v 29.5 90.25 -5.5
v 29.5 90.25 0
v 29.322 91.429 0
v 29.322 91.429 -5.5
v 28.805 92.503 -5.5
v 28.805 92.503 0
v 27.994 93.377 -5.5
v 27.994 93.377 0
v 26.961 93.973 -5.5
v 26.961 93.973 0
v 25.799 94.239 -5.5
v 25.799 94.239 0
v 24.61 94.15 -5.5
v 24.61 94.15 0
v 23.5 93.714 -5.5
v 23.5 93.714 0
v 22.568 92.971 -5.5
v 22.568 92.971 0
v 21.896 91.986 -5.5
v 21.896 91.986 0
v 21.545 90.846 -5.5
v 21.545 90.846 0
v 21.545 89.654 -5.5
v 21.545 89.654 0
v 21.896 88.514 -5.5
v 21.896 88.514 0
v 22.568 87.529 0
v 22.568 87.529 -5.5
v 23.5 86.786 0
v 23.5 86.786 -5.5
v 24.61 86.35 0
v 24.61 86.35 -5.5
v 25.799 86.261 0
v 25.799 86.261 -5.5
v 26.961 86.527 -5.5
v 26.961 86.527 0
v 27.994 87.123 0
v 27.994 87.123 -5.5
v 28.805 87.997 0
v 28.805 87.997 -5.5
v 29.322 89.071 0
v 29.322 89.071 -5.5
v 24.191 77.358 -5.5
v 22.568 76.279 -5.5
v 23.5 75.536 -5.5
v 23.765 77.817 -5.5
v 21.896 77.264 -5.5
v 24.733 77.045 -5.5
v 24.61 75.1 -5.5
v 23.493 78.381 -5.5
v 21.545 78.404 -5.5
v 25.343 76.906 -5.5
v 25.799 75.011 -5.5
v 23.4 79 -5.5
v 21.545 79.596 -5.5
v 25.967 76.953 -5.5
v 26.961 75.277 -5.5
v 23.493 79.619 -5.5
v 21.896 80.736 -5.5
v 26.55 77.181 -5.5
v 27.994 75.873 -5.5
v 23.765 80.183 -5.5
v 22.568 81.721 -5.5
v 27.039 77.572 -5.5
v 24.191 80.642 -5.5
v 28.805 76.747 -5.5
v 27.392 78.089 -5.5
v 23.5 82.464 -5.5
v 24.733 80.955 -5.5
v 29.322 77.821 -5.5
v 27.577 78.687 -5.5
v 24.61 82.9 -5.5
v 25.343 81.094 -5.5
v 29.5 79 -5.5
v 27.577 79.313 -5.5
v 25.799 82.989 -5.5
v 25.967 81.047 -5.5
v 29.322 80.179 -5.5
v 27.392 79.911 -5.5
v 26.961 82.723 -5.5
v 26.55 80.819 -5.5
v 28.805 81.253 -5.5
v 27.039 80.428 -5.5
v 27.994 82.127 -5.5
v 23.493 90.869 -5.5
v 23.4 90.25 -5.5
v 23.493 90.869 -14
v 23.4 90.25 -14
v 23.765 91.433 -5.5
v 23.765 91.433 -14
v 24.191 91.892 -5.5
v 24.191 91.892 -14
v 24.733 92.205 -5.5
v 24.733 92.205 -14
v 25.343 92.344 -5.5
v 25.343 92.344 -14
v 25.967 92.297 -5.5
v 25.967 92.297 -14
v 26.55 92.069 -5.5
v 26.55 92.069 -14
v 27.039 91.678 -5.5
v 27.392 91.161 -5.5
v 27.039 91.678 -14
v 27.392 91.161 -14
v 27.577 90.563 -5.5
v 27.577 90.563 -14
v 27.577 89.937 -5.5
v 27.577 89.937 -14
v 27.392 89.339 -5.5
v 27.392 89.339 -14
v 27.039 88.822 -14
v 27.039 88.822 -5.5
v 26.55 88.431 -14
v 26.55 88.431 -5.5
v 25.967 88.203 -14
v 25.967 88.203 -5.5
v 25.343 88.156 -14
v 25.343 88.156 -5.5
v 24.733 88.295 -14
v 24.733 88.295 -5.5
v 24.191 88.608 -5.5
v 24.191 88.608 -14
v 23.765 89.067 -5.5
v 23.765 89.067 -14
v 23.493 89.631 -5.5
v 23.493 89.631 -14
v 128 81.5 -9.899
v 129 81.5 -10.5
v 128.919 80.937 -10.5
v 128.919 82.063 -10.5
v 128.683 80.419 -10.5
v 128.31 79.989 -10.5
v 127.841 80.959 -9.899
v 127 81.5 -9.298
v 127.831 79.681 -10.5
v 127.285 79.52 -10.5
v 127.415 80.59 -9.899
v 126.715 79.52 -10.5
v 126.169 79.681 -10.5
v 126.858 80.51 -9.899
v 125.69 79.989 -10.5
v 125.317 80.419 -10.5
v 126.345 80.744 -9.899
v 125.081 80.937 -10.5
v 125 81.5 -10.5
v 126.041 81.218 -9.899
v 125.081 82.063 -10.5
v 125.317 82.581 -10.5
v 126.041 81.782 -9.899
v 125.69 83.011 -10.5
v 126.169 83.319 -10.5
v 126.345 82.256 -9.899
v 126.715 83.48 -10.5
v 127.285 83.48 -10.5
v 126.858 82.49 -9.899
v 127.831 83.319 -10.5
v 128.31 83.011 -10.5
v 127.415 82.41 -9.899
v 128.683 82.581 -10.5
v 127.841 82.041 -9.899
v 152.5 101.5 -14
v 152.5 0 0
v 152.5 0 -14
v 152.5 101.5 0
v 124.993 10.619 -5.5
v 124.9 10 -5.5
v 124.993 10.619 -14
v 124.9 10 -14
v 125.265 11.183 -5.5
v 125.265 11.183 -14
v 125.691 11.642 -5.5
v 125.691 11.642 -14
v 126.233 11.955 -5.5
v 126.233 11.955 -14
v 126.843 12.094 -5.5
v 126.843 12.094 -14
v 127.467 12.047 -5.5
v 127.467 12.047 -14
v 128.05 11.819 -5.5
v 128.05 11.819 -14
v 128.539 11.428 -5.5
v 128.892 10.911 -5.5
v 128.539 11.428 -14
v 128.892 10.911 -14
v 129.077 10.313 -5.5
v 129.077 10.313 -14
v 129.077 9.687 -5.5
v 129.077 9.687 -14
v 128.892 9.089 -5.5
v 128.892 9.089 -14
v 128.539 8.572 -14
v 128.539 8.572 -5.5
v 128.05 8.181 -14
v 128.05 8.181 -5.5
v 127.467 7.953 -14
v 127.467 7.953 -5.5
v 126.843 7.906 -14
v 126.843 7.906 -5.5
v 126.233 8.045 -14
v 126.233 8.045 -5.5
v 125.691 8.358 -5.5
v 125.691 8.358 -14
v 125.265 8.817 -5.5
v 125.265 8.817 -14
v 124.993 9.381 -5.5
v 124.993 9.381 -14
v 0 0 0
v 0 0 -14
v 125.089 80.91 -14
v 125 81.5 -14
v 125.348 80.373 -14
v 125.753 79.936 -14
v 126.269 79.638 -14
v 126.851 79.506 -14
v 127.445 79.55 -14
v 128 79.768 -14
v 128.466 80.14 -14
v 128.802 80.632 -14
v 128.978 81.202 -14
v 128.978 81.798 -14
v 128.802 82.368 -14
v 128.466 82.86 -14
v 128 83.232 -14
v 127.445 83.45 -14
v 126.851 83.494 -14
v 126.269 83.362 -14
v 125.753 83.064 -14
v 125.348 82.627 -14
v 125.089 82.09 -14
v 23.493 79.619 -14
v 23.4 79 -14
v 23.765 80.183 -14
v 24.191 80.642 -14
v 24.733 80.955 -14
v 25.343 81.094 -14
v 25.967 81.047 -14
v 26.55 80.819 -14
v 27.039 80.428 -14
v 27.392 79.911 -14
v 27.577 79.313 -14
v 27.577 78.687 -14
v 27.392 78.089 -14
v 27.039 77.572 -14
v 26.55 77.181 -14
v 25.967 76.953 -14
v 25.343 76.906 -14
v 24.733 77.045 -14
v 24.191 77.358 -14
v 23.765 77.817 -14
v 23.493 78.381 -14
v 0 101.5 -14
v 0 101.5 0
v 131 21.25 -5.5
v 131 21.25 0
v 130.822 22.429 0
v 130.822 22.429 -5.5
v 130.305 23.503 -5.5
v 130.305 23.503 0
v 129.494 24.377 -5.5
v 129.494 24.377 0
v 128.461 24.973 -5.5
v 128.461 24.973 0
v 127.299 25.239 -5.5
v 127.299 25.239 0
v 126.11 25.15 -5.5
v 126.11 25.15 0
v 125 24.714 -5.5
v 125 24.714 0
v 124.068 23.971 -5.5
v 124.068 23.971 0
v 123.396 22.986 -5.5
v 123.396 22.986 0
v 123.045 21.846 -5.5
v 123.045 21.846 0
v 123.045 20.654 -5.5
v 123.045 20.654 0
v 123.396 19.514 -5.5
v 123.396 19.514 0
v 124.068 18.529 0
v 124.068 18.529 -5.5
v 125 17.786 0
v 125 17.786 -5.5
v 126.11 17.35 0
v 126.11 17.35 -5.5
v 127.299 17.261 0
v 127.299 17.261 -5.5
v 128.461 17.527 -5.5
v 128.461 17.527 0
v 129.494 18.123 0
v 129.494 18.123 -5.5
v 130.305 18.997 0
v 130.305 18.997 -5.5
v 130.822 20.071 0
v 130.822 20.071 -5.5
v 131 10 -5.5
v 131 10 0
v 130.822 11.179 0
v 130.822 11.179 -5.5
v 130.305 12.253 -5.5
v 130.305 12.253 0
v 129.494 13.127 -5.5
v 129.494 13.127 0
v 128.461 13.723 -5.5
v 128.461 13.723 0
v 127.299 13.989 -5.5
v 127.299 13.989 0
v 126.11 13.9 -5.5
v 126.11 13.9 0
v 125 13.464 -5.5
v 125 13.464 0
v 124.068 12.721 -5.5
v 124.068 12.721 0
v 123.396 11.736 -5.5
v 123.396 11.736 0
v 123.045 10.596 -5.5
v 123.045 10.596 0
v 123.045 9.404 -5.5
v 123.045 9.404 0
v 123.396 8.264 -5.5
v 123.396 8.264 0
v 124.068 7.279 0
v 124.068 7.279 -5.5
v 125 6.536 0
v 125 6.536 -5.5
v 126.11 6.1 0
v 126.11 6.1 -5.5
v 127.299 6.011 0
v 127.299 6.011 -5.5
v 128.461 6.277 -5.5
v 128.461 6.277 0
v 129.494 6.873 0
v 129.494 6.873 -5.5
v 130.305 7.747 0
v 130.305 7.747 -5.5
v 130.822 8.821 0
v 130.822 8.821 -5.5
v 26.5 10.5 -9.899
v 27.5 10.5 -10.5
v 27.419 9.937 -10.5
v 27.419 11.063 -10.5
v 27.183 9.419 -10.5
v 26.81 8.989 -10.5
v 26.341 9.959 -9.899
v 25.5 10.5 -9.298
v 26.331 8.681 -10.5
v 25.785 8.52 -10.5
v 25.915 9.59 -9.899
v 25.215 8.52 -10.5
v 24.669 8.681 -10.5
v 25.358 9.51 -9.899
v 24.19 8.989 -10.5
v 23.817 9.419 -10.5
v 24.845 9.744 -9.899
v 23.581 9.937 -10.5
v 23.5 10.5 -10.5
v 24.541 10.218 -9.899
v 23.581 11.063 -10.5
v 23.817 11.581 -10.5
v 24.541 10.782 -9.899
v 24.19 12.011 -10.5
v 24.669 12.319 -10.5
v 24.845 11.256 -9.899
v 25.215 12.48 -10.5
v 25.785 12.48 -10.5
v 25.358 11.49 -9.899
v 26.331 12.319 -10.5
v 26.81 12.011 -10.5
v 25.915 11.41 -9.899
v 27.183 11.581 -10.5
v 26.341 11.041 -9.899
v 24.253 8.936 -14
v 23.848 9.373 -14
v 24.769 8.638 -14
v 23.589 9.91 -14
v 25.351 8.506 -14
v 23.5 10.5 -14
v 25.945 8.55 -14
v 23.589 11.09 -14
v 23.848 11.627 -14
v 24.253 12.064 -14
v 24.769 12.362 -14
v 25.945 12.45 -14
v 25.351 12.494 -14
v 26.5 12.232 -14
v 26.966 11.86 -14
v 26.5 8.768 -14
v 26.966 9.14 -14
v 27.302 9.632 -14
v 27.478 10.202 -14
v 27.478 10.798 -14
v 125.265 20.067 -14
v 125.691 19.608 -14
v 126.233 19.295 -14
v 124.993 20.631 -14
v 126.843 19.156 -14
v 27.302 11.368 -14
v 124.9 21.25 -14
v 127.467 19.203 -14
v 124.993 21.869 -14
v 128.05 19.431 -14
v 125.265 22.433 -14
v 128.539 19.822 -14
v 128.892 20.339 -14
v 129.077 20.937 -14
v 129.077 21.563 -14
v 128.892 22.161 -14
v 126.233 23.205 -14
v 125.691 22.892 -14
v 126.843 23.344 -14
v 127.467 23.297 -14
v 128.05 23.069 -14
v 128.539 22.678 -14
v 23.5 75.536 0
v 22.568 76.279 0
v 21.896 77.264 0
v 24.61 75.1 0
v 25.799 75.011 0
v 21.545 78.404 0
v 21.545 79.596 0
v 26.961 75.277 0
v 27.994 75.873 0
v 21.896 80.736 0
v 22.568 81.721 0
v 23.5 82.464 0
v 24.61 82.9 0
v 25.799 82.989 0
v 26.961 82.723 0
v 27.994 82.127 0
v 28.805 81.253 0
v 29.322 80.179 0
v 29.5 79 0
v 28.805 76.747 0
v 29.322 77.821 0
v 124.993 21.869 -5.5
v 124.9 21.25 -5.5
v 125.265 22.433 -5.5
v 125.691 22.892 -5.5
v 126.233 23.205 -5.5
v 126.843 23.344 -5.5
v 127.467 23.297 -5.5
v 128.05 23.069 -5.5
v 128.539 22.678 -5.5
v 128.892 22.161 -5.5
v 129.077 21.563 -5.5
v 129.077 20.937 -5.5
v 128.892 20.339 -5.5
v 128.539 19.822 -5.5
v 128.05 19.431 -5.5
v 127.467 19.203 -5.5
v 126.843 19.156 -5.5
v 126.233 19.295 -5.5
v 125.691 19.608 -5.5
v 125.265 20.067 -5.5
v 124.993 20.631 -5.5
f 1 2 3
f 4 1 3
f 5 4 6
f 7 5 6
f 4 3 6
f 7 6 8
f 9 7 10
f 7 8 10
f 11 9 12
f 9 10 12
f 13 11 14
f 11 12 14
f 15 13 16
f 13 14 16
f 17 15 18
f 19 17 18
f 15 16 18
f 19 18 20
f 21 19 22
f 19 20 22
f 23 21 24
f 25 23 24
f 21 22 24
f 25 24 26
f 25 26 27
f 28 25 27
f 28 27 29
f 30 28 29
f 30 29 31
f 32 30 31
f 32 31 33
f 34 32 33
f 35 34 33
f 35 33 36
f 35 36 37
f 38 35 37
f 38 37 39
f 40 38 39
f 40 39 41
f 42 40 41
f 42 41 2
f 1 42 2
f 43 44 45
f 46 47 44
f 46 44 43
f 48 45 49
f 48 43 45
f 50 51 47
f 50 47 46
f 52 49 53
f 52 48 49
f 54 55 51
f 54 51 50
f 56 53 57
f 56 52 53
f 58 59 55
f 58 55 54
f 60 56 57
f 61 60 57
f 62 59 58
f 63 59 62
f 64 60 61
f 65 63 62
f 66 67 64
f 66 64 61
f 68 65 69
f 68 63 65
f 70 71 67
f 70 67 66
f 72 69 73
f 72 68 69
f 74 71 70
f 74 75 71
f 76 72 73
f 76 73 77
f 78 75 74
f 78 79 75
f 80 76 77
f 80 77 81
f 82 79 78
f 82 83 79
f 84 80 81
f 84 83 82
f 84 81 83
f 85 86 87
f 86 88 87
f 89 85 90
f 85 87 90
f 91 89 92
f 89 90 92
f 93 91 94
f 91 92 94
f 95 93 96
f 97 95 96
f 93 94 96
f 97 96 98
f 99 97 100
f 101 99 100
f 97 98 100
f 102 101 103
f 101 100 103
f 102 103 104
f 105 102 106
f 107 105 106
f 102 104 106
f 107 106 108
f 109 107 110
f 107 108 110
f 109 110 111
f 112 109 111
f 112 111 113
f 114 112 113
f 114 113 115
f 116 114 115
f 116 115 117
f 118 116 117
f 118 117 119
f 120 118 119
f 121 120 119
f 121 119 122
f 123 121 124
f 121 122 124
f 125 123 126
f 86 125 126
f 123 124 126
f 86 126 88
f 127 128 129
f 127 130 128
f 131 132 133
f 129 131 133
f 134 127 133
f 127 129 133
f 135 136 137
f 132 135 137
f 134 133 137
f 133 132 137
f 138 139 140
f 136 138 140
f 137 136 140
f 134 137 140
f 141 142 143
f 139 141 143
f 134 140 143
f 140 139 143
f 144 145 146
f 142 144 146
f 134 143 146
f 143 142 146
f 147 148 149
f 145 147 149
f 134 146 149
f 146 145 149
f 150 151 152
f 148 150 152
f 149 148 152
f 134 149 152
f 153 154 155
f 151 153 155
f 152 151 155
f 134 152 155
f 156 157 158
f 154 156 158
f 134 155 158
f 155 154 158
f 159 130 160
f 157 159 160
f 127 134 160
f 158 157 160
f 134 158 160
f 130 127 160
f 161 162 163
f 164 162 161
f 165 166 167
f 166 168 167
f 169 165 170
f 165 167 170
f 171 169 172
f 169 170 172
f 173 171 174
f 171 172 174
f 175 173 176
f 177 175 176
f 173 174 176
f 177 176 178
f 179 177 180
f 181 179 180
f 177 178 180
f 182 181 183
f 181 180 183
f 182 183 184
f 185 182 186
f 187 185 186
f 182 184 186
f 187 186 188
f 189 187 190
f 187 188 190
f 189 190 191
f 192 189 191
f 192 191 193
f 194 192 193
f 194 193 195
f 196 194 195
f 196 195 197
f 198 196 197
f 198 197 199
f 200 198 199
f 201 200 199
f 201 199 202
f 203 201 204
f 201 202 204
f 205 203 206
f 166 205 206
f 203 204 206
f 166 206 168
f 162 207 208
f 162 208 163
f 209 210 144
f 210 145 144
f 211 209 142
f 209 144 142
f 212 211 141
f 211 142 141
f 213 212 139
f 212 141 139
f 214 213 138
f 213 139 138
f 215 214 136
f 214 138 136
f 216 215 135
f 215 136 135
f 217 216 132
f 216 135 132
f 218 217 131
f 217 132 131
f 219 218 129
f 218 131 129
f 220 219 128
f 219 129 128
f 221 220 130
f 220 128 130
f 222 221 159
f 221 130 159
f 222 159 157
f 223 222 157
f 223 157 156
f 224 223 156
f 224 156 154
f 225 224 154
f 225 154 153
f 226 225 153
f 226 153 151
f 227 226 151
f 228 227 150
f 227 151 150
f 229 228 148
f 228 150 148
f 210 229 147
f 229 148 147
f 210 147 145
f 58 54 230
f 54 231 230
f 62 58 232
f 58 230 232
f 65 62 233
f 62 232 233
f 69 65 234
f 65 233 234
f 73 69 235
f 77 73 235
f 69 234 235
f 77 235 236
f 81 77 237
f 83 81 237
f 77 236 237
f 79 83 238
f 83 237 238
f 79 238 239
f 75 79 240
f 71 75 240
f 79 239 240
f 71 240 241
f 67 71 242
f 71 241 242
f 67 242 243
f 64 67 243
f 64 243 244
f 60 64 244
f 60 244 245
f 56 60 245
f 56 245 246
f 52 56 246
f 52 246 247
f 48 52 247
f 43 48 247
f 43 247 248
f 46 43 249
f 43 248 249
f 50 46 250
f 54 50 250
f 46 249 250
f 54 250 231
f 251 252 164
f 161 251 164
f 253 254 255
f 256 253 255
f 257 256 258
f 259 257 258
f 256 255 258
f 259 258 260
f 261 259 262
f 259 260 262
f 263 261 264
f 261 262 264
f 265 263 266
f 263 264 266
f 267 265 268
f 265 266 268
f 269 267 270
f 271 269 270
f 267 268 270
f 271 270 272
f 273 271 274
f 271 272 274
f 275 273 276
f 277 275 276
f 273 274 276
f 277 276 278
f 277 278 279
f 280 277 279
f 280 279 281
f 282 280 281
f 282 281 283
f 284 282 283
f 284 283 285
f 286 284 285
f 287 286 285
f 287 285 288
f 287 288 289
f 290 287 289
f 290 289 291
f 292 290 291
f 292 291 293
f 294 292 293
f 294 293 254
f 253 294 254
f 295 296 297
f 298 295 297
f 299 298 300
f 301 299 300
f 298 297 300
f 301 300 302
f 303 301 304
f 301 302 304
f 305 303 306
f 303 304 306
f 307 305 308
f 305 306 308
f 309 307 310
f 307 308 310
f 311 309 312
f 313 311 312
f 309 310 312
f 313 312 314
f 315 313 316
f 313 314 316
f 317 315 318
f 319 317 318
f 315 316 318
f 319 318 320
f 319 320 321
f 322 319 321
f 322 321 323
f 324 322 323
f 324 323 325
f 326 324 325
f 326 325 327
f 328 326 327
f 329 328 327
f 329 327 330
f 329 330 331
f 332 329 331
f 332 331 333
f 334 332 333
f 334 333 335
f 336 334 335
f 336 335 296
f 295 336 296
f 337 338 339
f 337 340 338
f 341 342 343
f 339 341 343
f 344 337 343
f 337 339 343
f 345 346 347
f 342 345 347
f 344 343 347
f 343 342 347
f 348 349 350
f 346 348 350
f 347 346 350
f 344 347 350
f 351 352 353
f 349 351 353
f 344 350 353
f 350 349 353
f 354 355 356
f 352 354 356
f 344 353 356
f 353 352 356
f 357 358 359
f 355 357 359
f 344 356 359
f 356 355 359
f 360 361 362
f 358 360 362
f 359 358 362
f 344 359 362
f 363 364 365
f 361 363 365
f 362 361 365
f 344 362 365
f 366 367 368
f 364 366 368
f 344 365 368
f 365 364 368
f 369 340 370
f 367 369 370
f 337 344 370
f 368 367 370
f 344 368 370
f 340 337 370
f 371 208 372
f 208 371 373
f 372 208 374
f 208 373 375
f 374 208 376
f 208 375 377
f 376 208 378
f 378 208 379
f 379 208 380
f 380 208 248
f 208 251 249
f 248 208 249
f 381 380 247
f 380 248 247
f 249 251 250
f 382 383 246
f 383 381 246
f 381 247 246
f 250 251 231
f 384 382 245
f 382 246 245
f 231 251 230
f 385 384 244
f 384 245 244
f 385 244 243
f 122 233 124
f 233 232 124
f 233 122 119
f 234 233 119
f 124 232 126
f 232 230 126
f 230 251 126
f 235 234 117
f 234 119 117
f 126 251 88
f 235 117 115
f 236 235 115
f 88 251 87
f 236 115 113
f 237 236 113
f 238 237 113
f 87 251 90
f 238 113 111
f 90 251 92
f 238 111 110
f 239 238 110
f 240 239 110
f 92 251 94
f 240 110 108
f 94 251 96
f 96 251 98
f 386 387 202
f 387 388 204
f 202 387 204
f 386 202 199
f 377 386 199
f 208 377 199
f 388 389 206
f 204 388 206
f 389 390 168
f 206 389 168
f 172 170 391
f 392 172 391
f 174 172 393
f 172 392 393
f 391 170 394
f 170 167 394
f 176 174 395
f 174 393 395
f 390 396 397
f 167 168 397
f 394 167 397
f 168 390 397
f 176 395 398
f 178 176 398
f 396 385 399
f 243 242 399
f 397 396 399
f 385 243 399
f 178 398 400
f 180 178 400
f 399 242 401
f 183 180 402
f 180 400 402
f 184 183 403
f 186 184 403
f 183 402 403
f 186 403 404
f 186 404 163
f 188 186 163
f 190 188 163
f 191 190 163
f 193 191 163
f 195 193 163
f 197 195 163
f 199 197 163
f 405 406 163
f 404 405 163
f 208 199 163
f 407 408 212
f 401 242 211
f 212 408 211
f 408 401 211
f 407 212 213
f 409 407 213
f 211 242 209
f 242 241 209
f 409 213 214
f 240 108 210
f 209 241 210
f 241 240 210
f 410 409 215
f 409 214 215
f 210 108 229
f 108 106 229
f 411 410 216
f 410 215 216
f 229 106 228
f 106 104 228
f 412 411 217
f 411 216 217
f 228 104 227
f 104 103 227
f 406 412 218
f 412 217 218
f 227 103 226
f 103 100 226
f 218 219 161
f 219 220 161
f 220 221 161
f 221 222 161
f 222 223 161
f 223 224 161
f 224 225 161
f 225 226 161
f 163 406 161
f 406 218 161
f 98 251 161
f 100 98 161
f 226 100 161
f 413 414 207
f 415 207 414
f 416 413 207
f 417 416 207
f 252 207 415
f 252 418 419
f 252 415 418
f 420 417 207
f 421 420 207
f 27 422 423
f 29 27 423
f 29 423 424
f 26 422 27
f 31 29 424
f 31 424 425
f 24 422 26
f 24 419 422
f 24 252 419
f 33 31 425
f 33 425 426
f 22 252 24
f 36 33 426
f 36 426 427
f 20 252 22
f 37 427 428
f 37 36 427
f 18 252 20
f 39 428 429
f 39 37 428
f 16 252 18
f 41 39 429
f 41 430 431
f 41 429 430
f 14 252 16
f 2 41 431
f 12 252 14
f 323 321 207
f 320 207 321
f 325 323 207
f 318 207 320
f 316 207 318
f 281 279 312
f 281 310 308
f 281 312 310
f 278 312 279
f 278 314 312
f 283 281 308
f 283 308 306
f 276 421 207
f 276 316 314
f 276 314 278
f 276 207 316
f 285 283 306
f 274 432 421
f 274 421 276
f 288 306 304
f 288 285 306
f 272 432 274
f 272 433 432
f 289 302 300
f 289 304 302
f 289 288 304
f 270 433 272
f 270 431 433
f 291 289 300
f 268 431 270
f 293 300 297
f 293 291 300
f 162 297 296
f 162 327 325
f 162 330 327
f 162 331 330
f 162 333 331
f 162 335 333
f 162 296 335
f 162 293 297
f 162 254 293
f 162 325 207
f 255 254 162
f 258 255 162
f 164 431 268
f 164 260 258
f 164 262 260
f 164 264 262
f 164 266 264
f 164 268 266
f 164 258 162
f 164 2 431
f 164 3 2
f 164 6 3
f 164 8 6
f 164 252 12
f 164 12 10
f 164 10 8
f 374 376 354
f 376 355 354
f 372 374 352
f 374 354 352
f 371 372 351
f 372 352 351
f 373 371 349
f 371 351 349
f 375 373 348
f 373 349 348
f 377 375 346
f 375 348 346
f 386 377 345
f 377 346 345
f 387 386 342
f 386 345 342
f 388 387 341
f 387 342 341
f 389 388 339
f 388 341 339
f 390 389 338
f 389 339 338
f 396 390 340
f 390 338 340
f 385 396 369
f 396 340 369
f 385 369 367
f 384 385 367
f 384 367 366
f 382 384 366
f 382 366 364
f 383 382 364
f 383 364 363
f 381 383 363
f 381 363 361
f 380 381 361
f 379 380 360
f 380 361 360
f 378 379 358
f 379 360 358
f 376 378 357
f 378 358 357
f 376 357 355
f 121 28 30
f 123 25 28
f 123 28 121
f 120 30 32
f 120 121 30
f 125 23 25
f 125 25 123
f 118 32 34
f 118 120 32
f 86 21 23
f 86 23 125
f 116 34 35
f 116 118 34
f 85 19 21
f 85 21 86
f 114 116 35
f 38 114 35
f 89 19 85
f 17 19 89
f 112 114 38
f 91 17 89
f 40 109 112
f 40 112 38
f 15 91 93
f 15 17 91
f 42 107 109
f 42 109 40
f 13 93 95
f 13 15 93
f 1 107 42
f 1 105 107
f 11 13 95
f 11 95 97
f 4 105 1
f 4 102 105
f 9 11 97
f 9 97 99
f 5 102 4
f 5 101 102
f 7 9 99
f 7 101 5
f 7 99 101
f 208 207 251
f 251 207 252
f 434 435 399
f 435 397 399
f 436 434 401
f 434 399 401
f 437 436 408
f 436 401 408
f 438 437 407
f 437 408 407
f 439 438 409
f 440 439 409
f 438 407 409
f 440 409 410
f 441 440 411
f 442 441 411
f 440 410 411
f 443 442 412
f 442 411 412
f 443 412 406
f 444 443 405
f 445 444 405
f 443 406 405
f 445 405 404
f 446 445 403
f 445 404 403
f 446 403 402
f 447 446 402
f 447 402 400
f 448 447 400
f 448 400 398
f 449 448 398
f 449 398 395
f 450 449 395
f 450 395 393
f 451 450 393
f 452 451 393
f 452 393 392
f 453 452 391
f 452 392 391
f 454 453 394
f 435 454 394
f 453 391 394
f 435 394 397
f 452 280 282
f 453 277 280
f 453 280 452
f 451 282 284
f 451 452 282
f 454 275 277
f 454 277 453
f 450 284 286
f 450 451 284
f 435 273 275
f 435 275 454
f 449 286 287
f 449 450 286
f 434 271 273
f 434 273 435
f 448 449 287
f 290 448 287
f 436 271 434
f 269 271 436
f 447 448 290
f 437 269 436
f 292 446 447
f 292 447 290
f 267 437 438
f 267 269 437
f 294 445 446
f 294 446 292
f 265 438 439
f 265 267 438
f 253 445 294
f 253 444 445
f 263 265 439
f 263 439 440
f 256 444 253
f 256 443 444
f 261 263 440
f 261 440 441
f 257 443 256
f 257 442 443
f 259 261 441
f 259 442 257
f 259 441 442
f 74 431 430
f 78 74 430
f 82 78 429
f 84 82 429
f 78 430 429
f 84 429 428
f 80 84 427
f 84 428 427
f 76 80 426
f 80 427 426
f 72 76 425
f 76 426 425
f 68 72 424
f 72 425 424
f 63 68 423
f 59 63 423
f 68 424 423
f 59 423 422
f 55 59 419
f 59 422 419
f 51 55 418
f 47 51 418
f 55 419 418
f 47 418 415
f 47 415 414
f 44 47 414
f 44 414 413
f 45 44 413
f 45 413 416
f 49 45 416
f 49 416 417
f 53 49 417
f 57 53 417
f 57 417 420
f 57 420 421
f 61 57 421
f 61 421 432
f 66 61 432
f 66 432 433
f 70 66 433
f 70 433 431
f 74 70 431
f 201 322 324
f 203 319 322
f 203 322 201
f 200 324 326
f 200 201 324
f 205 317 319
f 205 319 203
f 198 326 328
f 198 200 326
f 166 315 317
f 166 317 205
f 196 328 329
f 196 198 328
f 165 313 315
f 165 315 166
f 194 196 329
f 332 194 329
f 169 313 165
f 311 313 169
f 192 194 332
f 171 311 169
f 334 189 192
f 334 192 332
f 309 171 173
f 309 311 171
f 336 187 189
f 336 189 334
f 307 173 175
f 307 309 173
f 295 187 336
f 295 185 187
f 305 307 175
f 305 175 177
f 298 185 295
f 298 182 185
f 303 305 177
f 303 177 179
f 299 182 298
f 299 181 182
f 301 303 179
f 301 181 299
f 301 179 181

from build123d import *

# Parameters (mm, degrees)
F0_W           = 152.5
F0_H           = 101.5
F1_DEPTH       = 14
F2_D           = 4.2
F2_CBORE_D     = 8
F2_CBORE_DEPTH = 5.5
F4_D           = 4
F4_DEPTH       = 3.5
F4_TIP         = 1.2017212381


with BuildPart() as f1:
    # F0 (on Top) → F1 (new body)
    with BuildSketch(Plane.XY):
        with Locations((76.25, 50.75)):
            Rectangle(F0_W, F0_H)
    extrude(amount=-F1_DEPTH)

    # F2 (through all)
    with Locations(Plane.XY):
        with Locations((127, 10), (127, 21.25), (25.5, 90.25), (25.5, 79)):
            CounterBoreHole(F2_D / 2, F2_CBORE_D / 2, F2_CBORE_DEPTH)

    # F4
    with Locations(Plane(origin=(0, 0, -14), x_dir=(1, 0, 0), z_dir=(0, 0, -1))):
        with Locations((25.5, -10.5), (127, -81.5)):
            Hole(F4_D / 2, depth=F4_DEPTH)
            with Locations((0, 0, -(F4_DEPTH + F4_TIP / 2))):  # 118° drill point
                Cone(0, F4_D / 2, F4_TIP, mode=Mode.SUBTRACT)


solid = f1.part
